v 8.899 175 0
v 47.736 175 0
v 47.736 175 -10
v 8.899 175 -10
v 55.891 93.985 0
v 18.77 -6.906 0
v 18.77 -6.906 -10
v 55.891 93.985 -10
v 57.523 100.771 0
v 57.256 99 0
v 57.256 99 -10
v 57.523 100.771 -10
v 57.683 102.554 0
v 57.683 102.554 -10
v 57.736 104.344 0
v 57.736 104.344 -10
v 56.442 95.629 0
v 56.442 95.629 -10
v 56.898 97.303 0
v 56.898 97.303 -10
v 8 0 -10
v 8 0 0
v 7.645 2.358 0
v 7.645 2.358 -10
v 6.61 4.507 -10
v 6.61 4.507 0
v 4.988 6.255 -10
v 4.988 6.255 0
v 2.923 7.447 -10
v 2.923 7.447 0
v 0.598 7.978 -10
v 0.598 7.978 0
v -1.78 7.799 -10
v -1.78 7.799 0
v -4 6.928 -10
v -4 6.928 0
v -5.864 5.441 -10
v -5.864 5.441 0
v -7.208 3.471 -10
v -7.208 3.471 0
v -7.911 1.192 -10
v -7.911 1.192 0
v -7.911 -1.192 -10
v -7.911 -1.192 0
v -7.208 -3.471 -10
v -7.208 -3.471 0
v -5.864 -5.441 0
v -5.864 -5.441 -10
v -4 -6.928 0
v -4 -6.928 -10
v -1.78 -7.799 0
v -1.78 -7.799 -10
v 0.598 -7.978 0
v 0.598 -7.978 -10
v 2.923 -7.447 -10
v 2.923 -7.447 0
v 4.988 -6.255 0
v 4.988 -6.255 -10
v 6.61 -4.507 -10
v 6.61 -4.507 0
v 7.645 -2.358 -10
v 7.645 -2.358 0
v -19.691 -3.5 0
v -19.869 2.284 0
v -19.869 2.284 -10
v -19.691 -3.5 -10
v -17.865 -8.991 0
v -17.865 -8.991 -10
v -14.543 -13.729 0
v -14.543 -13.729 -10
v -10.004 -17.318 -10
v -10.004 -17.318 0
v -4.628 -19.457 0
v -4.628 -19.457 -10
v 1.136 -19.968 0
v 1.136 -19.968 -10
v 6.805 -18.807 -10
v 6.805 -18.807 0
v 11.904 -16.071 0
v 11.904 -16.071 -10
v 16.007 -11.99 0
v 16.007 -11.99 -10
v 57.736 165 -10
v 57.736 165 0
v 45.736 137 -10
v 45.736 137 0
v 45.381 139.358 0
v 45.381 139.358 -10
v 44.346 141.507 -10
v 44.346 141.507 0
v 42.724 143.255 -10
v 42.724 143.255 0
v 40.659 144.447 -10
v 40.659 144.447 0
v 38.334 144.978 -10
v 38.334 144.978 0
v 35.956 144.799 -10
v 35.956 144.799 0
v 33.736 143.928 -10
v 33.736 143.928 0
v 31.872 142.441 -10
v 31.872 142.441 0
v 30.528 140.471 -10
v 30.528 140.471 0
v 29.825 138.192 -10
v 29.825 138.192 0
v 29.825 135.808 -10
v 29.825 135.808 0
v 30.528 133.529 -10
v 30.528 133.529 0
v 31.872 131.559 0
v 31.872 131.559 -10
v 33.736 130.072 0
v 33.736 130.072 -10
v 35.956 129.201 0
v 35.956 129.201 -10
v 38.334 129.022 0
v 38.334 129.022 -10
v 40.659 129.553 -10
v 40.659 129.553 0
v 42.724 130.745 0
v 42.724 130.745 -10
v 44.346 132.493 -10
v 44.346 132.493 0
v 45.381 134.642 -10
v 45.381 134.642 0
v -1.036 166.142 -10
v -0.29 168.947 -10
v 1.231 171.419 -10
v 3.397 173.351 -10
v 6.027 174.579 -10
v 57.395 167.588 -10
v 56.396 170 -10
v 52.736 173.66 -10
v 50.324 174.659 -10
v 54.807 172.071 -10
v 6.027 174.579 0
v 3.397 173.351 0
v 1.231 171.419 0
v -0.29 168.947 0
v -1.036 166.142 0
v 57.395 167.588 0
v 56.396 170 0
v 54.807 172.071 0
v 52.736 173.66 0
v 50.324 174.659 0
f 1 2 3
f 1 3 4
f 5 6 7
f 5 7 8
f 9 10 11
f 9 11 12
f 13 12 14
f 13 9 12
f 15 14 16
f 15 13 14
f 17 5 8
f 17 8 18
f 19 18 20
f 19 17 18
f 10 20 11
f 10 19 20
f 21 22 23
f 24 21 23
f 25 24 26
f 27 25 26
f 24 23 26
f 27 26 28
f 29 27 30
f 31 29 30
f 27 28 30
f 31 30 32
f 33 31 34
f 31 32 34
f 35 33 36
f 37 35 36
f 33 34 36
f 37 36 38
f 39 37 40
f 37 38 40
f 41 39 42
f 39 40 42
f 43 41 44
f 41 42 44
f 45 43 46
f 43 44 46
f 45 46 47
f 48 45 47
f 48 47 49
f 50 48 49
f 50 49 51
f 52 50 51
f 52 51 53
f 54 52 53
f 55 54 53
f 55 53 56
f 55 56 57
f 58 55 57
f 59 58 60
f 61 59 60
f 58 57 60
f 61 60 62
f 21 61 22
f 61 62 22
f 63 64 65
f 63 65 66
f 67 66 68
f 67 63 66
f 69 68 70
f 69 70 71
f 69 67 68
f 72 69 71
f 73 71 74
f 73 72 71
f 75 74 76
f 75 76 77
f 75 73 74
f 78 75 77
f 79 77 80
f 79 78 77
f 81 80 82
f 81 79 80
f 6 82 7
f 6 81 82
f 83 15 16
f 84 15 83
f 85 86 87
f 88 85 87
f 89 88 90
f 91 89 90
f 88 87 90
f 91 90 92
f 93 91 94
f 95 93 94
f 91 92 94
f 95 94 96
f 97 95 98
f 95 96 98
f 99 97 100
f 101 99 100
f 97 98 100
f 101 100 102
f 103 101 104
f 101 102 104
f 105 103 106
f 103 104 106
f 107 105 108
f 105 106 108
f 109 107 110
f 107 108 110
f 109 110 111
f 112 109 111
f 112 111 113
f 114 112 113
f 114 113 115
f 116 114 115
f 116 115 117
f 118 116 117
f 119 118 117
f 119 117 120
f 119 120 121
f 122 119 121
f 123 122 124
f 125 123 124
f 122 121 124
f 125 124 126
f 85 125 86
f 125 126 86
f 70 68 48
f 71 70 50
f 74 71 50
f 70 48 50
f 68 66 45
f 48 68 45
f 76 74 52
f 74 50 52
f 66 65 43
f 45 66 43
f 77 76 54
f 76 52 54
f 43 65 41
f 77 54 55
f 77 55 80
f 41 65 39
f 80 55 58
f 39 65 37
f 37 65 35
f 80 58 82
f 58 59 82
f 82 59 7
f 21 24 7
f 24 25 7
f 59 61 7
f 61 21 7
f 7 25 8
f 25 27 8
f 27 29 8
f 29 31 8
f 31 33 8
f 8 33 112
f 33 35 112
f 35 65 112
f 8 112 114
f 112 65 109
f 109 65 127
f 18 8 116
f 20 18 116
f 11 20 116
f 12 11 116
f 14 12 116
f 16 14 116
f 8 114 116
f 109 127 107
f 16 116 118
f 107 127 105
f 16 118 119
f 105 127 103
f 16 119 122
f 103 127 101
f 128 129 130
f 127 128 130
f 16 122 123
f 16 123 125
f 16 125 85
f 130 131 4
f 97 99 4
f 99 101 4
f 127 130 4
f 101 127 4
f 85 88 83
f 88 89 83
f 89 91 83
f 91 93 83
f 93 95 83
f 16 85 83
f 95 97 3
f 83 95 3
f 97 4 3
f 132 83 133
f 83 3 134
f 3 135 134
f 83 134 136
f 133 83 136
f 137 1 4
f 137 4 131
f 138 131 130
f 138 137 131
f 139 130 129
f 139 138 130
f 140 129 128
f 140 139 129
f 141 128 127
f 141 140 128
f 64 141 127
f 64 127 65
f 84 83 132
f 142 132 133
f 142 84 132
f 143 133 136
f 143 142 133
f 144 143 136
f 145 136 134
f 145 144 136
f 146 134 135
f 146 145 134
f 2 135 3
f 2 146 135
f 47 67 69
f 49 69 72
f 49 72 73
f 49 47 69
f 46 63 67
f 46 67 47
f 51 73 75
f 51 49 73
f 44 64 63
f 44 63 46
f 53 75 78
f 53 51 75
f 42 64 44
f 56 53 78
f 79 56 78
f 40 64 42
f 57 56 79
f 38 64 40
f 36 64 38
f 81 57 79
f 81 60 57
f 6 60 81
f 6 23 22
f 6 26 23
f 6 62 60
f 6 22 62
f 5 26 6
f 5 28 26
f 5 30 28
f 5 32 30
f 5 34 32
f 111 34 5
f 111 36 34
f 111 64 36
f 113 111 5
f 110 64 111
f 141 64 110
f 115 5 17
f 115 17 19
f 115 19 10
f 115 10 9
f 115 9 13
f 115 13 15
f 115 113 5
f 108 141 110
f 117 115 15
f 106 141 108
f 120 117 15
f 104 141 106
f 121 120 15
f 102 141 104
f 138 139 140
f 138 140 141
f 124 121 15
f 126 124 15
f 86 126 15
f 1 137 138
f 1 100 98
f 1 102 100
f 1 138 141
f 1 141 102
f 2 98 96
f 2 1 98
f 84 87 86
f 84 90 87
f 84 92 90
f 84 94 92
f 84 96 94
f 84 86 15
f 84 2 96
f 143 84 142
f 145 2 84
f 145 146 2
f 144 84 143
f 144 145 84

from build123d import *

# Parameters (mm, degrees)
SZKIC1_R                    = 20
SZKIC1_R_2                  = 8
DODANIE_WYCI_GNI_CIE1_DEPTH = 10


with BuildPart() as part:
    # Szkic1 → Dodanie-wyciągnięcie1 (new body)
    # profile 1 of 3: a face of its own
    with BuildSketch(Plane.XY):
        with BuildLine():
            Line((17.736087047, 99), (17.736087047, 175))
            Line((17.736087047, 175), (8.898572724, 175))
            ThreePointArc((8.898572724, 175), (2.243439653, 172.463859847), (-1.036023376, 166.141840763))
            Line((-1.036023376, 166.141840763), (-19.8691922, 2.283681526))
            ThreePointArc((-19.8691922, 2.283681526), (1.143712376, 19.967271271), (20, 0))
            ThreePointArc((20, 0), (19.69005749, -3.507368821), (18.769836395, -6.906029373))
            Line((18.769836395, -6.906029373), (55.890841639, 93.984823763))
            ThreePointArc((55.890841639, 93.984823763), (56.682391116, 96.462784094), (57.25630176, 99))
            Line((57.25630176, 99), (17.736087047, 99))
        make_face()
    # profile 2 of 3: a face of its own
    with BuildSketch(Plane.XY):
        Circle(SZKIC1_R)
        Circle(SZKIC1_R_2, mode=Mode.SUBTRACT)
    # profile 3 of 3: a face of its own
    with BuildSketch(Plane.XY):
        with BuildLine():
            Line((47.736087047, 175), (17.736087047, 175))
            Line((17.736087047, 175), (17.736087047, 99))
            Line((17.736087047, 99), (57.25630176, 99))
            ThreePointArc((57.25630176, 99), (57.615899976, 101.661186457), (57.736087047, 104.343867823))
            Line((57.736087047, 104.343867823), (57.736087047, 165))
            ThreePointArc((57.736087047, 165), (54.807154859, 172.071067812), (47.736087047, 175))
        make_face()
        with Locations((37.736087047, 137)):
            Circle(SZKIC1_R_2, mode=Mode.SUBTRACT)
    extrude(amount=-DODANIE_WYCI_GNI_CIE1_DEPTH)


solid = part.part
